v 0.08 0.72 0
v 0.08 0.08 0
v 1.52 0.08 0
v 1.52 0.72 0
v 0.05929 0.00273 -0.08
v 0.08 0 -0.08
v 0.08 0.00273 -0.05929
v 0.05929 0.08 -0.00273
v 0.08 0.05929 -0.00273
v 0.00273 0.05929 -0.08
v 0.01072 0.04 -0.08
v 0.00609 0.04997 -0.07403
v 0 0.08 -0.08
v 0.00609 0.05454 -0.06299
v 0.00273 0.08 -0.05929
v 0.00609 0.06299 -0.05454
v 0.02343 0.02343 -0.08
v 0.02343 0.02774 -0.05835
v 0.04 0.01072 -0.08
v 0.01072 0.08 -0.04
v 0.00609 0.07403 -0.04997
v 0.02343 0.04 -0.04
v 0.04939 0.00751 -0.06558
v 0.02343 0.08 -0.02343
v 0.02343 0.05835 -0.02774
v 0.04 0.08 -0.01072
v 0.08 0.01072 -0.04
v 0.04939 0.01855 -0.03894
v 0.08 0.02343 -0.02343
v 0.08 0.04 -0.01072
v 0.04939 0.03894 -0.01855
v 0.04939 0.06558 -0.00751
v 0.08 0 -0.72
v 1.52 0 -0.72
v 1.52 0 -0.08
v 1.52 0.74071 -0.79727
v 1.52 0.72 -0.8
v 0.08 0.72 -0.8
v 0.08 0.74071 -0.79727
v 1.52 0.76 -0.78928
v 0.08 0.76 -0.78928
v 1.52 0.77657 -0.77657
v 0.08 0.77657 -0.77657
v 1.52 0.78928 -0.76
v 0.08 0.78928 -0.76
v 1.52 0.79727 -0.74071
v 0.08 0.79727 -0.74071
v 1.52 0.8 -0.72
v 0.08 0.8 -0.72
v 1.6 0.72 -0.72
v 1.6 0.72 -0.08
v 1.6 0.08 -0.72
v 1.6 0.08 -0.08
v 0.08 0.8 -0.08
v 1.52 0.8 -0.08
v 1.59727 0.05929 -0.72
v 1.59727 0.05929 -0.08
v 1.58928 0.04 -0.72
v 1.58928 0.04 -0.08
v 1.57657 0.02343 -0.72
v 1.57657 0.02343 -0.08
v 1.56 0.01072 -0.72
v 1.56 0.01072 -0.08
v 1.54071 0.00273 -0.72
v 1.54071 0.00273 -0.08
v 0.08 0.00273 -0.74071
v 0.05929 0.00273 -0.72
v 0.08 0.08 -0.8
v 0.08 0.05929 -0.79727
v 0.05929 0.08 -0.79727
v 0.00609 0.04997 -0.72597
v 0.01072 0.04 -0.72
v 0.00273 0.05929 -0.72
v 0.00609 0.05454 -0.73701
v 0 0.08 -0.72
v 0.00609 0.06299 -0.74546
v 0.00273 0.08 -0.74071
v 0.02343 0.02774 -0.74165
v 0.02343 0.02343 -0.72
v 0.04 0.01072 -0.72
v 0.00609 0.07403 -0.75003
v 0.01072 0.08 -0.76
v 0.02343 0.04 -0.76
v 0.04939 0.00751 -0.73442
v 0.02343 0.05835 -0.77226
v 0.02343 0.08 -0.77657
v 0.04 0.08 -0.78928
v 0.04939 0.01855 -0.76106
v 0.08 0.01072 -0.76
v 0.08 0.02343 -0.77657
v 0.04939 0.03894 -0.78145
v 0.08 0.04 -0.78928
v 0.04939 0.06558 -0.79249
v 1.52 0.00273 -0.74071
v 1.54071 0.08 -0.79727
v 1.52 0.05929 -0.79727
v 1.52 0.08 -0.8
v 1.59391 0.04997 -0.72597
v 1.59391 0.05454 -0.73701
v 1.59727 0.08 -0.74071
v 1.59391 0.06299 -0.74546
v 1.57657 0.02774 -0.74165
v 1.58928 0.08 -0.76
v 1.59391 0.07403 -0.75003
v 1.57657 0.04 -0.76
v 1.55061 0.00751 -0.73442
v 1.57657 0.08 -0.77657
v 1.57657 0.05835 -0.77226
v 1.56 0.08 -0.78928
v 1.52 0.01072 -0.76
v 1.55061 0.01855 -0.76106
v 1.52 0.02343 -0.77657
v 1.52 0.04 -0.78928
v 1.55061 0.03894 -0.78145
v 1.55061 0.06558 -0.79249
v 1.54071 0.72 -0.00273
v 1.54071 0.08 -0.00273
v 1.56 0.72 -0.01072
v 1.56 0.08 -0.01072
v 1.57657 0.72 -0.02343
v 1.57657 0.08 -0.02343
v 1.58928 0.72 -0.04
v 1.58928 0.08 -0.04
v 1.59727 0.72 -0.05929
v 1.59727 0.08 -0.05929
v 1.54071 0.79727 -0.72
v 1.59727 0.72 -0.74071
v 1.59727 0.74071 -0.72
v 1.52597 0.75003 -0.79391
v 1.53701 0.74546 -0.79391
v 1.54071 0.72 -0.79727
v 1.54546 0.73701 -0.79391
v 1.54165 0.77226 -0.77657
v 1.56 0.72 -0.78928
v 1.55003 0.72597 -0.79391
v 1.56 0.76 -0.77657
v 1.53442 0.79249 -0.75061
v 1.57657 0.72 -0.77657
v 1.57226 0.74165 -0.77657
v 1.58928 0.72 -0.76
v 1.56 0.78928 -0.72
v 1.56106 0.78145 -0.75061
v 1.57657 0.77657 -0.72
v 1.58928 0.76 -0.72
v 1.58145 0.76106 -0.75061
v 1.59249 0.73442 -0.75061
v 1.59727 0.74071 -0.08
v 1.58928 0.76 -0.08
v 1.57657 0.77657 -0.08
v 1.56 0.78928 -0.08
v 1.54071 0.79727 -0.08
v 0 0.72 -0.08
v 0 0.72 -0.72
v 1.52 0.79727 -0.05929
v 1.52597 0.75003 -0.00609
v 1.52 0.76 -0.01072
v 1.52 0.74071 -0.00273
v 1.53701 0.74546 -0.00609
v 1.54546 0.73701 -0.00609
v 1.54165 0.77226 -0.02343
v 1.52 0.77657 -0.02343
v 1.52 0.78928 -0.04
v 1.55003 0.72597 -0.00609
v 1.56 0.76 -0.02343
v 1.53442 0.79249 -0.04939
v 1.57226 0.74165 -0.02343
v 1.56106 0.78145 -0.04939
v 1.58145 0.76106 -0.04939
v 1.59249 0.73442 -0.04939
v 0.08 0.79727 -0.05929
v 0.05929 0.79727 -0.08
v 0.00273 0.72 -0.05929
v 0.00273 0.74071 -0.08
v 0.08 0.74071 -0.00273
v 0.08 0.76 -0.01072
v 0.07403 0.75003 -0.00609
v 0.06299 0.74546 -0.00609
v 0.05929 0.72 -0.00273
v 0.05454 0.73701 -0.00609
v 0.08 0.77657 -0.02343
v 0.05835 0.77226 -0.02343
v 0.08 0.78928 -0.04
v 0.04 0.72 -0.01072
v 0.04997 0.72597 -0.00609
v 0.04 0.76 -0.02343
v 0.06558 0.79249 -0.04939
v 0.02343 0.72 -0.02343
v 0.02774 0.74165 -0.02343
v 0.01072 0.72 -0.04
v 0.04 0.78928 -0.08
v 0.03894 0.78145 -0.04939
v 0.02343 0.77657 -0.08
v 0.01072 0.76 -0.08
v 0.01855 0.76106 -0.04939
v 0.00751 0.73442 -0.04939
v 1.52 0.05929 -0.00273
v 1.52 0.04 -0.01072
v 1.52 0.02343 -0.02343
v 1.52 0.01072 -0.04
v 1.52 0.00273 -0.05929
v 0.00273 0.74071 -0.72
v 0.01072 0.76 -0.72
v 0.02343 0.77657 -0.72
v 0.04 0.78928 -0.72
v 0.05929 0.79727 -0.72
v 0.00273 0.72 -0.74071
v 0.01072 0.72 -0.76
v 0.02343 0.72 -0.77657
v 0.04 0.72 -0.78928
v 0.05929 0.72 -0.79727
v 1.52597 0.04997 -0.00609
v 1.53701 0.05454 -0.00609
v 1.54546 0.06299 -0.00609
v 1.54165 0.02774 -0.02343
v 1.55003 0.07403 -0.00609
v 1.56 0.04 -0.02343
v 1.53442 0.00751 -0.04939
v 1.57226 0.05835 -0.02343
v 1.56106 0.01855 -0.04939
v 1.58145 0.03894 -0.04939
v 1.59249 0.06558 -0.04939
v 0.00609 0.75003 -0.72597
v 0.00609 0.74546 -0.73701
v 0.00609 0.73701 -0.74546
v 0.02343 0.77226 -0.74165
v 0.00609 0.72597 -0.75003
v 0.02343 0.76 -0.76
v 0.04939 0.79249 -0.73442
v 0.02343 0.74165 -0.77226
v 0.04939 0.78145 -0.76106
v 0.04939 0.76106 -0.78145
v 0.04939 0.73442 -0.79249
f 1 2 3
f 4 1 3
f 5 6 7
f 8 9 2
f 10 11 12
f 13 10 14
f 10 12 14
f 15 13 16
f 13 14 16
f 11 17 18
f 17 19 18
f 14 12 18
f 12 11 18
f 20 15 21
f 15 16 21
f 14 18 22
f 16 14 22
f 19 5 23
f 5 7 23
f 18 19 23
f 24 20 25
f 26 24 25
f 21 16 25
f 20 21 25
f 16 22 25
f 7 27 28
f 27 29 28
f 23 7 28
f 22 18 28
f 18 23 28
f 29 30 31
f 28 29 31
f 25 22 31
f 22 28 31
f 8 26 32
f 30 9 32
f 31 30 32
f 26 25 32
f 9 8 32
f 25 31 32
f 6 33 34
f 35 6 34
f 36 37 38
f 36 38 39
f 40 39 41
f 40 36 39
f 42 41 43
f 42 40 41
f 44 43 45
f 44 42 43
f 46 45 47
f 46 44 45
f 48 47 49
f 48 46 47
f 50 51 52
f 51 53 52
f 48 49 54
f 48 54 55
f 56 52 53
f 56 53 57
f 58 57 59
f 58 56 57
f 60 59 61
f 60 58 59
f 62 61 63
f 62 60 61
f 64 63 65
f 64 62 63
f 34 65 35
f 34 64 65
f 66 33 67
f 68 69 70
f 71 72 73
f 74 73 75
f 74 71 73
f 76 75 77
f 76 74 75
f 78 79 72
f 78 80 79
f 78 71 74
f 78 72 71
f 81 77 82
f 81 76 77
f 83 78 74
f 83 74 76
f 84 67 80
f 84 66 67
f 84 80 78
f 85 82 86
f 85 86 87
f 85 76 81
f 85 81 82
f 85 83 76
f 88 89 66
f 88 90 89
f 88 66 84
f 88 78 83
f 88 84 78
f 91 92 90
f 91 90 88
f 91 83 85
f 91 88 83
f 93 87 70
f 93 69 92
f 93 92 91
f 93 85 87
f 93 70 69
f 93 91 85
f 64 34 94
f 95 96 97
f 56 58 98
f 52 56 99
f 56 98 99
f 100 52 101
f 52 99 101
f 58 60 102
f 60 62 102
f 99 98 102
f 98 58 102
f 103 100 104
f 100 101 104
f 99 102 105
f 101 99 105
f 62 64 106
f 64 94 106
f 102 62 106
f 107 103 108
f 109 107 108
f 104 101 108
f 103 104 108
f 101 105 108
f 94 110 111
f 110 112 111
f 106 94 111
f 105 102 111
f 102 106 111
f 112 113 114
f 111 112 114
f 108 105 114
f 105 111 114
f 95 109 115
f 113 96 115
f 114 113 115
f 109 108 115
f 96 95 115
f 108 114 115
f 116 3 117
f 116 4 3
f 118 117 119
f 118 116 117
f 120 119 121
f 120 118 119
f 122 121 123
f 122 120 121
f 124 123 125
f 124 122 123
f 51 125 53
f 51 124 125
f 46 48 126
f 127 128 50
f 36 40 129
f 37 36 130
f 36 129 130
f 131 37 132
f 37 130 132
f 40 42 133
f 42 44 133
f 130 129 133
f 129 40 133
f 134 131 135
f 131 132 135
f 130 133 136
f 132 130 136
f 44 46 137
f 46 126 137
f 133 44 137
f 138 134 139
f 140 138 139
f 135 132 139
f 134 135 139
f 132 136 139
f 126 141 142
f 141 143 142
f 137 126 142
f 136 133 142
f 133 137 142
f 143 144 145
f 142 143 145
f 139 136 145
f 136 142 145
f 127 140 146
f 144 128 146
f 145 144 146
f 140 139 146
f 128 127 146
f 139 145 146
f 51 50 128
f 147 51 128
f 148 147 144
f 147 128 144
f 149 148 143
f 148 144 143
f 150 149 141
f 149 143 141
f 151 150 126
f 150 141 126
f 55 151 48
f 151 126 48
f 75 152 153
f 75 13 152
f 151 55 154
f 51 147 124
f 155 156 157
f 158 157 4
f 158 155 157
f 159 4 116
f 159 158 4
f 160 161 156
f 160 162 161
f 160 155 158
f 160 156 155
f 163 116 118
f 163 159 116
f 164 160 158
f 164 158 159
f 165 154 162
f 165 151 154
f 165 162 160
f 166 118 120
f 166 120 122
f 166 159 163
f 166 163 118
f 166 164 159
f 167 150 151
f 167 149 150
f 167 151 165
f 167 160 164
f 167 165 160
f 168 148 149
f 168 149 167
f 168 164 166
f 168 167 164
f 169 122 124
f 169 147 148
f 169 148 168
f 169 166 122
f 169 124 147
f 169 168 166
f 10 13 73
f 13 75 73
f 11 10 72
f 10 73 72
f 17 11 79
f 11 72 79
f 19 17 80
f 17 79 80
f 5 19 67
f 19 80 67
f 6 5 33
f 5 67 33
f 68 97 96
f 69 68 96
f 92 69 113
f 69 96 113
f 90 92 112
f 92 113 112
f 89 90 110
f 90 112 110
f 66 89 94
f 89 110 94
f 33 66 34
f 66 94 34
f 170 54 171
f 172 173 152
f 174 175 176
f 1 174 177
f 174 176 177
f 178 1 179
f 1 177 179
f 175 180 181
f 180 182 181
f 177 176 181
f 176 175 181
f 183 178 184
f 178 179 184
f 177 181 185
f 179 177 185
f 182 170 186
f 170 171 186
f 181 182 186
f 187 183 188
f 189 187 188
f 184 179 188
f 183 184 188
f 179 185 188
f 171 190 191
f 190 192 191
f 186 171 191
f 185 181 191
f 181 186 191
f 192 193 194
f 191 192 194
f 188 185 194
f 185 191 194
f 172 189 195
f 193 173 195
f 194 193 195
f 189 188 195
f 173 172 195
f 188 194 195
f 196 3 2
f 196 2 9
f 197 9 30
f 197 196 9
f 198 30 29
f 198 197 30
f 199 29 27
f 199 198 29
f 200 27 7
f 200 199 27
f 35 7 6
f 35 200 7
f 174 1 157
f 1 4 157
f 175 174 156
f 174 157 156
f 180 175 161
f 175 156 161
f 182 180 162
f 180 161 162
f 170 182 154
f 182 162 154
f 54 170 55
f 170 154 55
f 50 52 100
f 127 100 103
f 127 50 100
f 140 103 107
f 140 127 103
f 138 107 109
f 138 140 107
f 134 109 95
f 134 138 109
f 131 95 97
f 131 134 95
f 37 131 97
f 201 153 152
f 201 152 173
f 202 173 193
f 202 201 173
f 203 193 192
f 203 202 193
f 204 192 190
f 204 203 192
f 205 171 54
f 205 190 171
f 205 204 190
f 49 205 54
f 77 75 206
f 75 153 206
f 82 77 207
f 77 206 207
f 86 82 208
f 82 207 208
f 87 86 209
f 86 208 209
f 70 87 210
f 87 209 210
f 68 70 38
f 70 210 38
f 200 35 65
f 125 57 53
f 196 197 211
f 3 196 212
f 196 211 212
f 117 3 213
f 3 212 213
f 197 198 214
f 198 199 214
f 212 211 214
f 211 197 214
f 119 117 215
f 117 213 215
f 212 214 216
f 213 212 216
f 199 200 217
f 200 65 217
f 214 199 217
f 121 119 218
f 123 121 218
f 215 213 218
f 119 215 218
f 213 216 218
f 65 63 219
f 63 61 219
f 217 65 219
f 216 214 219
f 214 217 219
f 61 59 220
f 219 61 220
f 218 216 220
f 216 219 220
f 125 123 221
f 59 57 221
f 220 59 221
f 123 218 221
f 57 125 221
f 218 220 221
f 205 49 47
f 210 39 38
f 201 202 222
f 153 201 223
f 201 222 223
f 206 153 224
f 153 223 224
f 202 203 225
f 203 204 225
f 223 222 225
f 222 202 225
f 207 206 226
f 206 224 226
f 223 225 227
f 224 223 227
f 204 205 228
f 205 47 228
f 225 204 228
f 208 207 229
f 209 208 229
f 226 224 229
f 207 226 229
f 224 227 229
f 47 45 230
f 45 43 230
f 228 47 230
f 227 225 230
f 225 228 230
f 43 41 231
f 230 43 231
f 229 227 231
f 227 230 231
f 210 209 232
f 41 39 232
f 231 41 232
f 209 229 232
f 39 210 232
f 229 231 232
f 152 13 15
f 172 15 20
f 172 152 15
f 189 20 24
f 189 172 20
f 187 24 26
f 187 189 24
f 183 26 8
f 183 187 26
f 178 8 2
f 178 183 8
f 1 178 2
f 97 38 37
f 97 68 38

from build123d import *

# Parameters (mm, degrees)
ESBO_O1_W                = 1.6
ESBO_O1_H                = 0.8
RESSALTO_EXTRUS_O1_DEPTH = 0.8
FILETE2_R                = 0.08


with BuildPart() as part:
    # Esboço1 → Ressalto-extrusão1 (new body)
    with BuildSketch(Plane(origin=(0, 0, 0), x_dir=(1, 0, 0), z_dir=(0, 1, 0))):
        with Locations((0.8, 0.4)):
            Rectangle(ESBO_O1_W, ESBO_O1_H)
    extrude(amount=RESSALTO_EXTRUS_O1_DEPTH)

    # Filete2
    filete2_edges = [part.edges().sort_by_distance(p)[0] for p in [
        (1.6, 0.8, -0.4),
        (0.8, 0.8, -0.8),
        (0, 0.8, -0.4),
        (0.8, 0, -0.8),
        (1.6, 0, -0.4),
        (0.8, 0, 0),
        (0, 0, -0.4),
        (0.8, 0.8, 0),
        (0, 0.4, -0.8),
        (1.6, 0.4, -0.8),
        (1.6, 0.4, 0),
        (0, 0.4, 0),
    ]]
    fillet(filete2_edges, radius=FILETE2_R)


solid = part.part
